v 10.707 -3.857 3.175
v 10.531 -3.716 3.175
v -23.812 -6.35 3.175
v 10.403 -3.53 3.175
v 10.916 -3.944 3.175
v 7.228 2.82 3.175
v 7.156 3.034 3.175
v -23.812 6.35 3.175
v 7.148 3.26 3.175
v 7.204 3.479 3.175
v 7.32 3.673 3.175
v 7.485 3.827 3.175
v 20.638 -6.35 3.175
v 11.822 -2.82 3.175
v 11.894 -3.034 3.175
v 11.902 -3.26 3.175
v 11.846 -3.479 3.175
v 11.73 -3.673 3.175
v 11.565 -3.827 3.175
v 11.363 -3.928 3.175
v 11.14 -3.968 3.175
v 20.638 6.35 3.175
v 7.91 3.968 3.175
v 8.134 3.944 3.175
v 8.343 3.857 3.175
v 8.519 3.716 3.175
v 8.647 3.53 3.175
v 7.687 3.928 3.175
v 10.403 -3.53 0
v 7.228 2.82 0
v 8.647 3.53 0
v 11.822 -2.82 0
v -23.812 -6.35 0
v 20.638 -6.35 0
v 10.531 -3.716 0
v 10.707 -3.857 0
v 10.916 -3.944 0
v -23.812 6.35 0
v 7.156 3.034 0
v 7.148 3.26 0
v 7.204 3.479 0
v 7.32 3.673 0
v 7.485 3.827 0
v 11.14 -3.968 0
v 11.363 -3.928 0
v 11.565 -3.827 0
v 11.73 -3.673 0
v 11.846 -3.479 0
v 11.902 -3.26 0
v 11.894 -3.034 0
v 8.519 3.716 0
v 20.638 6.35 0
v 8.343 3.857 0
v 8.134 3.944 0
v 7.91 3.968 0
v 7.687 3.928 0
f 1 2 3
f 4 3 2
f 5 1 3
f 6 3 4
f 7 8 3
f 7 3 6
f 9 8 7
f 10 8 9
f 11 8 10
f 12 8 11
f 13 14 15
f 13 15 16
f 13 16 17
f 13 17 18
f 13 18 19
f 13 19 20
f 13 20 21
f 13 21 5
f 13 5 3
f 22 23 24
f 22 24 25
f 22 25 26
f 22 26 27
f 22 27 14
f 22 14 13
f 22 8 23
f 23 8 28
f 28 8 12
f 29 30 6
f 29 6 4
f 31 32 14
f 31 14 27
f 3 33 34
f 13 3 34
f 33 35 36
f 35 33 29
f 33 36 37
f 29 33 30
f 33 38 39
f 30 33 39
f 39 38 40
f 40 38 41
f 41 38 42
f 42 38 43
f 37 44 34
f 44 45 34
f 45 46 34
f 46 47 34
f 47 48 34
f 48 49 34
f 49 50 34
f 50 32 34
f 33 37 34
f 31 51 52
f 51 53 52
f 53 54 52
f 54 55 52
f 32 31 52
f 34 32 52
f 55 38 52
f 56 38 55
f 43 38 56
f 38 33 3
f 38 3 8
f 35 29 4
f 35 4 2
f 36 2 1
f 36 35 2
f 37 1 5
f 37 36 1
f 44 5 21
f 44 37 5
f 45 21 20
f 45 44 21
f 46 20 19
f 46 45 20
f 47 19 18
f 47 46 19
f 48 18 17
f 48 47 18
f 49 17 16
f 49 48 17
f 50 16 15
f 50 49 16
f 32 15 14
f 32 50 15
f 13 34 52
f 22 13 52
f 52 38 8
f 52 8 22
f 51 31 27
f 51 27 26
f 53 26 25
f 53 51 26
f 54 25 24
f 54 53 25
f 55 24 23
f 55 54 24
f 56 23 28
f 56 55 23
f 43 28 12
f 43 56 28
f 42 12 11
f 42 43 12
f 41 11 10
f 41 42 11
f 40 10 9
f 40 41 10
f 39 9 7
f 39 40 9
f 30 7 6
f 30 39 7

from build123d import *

# Parameters (mm, degrees)
F0_W     = 44.45
F0_H     = 12.7
F1_DEPTH = 3.175
F3_DEPTH = 3.176


with BuildPart() as f1:
    # F0 (on Top) → F1 (new body)
    with BuildSketch(Plane.XY):
        with Locations((-1.5875, 0)):
            Rectangle(F0_W, F0_H)
    extrude(amount=F1_DEPTH)

    # F2 (on Top) → F3 (cut, through all)
    with BuildSketch(Plane.XY):
        with BuildLine():
            ThreePointArc((8.647452, 3.529976), (7.582524, 3.884952), (7.227548, 2.820024))
            Line((7.227548, 2.820024), (10.402548, -3.529976))
            ThreePointArc((10.402548, -3.529976), (11.467476, -3.884952), (11.822452, -2.820024))
            Line((11.822452, -2.820024), (8.647452, 3.529976))
        make_face()
    extrude(amount=F3_DEPTH, mode=Mode.SUBTRACT)


solid = f1.part
